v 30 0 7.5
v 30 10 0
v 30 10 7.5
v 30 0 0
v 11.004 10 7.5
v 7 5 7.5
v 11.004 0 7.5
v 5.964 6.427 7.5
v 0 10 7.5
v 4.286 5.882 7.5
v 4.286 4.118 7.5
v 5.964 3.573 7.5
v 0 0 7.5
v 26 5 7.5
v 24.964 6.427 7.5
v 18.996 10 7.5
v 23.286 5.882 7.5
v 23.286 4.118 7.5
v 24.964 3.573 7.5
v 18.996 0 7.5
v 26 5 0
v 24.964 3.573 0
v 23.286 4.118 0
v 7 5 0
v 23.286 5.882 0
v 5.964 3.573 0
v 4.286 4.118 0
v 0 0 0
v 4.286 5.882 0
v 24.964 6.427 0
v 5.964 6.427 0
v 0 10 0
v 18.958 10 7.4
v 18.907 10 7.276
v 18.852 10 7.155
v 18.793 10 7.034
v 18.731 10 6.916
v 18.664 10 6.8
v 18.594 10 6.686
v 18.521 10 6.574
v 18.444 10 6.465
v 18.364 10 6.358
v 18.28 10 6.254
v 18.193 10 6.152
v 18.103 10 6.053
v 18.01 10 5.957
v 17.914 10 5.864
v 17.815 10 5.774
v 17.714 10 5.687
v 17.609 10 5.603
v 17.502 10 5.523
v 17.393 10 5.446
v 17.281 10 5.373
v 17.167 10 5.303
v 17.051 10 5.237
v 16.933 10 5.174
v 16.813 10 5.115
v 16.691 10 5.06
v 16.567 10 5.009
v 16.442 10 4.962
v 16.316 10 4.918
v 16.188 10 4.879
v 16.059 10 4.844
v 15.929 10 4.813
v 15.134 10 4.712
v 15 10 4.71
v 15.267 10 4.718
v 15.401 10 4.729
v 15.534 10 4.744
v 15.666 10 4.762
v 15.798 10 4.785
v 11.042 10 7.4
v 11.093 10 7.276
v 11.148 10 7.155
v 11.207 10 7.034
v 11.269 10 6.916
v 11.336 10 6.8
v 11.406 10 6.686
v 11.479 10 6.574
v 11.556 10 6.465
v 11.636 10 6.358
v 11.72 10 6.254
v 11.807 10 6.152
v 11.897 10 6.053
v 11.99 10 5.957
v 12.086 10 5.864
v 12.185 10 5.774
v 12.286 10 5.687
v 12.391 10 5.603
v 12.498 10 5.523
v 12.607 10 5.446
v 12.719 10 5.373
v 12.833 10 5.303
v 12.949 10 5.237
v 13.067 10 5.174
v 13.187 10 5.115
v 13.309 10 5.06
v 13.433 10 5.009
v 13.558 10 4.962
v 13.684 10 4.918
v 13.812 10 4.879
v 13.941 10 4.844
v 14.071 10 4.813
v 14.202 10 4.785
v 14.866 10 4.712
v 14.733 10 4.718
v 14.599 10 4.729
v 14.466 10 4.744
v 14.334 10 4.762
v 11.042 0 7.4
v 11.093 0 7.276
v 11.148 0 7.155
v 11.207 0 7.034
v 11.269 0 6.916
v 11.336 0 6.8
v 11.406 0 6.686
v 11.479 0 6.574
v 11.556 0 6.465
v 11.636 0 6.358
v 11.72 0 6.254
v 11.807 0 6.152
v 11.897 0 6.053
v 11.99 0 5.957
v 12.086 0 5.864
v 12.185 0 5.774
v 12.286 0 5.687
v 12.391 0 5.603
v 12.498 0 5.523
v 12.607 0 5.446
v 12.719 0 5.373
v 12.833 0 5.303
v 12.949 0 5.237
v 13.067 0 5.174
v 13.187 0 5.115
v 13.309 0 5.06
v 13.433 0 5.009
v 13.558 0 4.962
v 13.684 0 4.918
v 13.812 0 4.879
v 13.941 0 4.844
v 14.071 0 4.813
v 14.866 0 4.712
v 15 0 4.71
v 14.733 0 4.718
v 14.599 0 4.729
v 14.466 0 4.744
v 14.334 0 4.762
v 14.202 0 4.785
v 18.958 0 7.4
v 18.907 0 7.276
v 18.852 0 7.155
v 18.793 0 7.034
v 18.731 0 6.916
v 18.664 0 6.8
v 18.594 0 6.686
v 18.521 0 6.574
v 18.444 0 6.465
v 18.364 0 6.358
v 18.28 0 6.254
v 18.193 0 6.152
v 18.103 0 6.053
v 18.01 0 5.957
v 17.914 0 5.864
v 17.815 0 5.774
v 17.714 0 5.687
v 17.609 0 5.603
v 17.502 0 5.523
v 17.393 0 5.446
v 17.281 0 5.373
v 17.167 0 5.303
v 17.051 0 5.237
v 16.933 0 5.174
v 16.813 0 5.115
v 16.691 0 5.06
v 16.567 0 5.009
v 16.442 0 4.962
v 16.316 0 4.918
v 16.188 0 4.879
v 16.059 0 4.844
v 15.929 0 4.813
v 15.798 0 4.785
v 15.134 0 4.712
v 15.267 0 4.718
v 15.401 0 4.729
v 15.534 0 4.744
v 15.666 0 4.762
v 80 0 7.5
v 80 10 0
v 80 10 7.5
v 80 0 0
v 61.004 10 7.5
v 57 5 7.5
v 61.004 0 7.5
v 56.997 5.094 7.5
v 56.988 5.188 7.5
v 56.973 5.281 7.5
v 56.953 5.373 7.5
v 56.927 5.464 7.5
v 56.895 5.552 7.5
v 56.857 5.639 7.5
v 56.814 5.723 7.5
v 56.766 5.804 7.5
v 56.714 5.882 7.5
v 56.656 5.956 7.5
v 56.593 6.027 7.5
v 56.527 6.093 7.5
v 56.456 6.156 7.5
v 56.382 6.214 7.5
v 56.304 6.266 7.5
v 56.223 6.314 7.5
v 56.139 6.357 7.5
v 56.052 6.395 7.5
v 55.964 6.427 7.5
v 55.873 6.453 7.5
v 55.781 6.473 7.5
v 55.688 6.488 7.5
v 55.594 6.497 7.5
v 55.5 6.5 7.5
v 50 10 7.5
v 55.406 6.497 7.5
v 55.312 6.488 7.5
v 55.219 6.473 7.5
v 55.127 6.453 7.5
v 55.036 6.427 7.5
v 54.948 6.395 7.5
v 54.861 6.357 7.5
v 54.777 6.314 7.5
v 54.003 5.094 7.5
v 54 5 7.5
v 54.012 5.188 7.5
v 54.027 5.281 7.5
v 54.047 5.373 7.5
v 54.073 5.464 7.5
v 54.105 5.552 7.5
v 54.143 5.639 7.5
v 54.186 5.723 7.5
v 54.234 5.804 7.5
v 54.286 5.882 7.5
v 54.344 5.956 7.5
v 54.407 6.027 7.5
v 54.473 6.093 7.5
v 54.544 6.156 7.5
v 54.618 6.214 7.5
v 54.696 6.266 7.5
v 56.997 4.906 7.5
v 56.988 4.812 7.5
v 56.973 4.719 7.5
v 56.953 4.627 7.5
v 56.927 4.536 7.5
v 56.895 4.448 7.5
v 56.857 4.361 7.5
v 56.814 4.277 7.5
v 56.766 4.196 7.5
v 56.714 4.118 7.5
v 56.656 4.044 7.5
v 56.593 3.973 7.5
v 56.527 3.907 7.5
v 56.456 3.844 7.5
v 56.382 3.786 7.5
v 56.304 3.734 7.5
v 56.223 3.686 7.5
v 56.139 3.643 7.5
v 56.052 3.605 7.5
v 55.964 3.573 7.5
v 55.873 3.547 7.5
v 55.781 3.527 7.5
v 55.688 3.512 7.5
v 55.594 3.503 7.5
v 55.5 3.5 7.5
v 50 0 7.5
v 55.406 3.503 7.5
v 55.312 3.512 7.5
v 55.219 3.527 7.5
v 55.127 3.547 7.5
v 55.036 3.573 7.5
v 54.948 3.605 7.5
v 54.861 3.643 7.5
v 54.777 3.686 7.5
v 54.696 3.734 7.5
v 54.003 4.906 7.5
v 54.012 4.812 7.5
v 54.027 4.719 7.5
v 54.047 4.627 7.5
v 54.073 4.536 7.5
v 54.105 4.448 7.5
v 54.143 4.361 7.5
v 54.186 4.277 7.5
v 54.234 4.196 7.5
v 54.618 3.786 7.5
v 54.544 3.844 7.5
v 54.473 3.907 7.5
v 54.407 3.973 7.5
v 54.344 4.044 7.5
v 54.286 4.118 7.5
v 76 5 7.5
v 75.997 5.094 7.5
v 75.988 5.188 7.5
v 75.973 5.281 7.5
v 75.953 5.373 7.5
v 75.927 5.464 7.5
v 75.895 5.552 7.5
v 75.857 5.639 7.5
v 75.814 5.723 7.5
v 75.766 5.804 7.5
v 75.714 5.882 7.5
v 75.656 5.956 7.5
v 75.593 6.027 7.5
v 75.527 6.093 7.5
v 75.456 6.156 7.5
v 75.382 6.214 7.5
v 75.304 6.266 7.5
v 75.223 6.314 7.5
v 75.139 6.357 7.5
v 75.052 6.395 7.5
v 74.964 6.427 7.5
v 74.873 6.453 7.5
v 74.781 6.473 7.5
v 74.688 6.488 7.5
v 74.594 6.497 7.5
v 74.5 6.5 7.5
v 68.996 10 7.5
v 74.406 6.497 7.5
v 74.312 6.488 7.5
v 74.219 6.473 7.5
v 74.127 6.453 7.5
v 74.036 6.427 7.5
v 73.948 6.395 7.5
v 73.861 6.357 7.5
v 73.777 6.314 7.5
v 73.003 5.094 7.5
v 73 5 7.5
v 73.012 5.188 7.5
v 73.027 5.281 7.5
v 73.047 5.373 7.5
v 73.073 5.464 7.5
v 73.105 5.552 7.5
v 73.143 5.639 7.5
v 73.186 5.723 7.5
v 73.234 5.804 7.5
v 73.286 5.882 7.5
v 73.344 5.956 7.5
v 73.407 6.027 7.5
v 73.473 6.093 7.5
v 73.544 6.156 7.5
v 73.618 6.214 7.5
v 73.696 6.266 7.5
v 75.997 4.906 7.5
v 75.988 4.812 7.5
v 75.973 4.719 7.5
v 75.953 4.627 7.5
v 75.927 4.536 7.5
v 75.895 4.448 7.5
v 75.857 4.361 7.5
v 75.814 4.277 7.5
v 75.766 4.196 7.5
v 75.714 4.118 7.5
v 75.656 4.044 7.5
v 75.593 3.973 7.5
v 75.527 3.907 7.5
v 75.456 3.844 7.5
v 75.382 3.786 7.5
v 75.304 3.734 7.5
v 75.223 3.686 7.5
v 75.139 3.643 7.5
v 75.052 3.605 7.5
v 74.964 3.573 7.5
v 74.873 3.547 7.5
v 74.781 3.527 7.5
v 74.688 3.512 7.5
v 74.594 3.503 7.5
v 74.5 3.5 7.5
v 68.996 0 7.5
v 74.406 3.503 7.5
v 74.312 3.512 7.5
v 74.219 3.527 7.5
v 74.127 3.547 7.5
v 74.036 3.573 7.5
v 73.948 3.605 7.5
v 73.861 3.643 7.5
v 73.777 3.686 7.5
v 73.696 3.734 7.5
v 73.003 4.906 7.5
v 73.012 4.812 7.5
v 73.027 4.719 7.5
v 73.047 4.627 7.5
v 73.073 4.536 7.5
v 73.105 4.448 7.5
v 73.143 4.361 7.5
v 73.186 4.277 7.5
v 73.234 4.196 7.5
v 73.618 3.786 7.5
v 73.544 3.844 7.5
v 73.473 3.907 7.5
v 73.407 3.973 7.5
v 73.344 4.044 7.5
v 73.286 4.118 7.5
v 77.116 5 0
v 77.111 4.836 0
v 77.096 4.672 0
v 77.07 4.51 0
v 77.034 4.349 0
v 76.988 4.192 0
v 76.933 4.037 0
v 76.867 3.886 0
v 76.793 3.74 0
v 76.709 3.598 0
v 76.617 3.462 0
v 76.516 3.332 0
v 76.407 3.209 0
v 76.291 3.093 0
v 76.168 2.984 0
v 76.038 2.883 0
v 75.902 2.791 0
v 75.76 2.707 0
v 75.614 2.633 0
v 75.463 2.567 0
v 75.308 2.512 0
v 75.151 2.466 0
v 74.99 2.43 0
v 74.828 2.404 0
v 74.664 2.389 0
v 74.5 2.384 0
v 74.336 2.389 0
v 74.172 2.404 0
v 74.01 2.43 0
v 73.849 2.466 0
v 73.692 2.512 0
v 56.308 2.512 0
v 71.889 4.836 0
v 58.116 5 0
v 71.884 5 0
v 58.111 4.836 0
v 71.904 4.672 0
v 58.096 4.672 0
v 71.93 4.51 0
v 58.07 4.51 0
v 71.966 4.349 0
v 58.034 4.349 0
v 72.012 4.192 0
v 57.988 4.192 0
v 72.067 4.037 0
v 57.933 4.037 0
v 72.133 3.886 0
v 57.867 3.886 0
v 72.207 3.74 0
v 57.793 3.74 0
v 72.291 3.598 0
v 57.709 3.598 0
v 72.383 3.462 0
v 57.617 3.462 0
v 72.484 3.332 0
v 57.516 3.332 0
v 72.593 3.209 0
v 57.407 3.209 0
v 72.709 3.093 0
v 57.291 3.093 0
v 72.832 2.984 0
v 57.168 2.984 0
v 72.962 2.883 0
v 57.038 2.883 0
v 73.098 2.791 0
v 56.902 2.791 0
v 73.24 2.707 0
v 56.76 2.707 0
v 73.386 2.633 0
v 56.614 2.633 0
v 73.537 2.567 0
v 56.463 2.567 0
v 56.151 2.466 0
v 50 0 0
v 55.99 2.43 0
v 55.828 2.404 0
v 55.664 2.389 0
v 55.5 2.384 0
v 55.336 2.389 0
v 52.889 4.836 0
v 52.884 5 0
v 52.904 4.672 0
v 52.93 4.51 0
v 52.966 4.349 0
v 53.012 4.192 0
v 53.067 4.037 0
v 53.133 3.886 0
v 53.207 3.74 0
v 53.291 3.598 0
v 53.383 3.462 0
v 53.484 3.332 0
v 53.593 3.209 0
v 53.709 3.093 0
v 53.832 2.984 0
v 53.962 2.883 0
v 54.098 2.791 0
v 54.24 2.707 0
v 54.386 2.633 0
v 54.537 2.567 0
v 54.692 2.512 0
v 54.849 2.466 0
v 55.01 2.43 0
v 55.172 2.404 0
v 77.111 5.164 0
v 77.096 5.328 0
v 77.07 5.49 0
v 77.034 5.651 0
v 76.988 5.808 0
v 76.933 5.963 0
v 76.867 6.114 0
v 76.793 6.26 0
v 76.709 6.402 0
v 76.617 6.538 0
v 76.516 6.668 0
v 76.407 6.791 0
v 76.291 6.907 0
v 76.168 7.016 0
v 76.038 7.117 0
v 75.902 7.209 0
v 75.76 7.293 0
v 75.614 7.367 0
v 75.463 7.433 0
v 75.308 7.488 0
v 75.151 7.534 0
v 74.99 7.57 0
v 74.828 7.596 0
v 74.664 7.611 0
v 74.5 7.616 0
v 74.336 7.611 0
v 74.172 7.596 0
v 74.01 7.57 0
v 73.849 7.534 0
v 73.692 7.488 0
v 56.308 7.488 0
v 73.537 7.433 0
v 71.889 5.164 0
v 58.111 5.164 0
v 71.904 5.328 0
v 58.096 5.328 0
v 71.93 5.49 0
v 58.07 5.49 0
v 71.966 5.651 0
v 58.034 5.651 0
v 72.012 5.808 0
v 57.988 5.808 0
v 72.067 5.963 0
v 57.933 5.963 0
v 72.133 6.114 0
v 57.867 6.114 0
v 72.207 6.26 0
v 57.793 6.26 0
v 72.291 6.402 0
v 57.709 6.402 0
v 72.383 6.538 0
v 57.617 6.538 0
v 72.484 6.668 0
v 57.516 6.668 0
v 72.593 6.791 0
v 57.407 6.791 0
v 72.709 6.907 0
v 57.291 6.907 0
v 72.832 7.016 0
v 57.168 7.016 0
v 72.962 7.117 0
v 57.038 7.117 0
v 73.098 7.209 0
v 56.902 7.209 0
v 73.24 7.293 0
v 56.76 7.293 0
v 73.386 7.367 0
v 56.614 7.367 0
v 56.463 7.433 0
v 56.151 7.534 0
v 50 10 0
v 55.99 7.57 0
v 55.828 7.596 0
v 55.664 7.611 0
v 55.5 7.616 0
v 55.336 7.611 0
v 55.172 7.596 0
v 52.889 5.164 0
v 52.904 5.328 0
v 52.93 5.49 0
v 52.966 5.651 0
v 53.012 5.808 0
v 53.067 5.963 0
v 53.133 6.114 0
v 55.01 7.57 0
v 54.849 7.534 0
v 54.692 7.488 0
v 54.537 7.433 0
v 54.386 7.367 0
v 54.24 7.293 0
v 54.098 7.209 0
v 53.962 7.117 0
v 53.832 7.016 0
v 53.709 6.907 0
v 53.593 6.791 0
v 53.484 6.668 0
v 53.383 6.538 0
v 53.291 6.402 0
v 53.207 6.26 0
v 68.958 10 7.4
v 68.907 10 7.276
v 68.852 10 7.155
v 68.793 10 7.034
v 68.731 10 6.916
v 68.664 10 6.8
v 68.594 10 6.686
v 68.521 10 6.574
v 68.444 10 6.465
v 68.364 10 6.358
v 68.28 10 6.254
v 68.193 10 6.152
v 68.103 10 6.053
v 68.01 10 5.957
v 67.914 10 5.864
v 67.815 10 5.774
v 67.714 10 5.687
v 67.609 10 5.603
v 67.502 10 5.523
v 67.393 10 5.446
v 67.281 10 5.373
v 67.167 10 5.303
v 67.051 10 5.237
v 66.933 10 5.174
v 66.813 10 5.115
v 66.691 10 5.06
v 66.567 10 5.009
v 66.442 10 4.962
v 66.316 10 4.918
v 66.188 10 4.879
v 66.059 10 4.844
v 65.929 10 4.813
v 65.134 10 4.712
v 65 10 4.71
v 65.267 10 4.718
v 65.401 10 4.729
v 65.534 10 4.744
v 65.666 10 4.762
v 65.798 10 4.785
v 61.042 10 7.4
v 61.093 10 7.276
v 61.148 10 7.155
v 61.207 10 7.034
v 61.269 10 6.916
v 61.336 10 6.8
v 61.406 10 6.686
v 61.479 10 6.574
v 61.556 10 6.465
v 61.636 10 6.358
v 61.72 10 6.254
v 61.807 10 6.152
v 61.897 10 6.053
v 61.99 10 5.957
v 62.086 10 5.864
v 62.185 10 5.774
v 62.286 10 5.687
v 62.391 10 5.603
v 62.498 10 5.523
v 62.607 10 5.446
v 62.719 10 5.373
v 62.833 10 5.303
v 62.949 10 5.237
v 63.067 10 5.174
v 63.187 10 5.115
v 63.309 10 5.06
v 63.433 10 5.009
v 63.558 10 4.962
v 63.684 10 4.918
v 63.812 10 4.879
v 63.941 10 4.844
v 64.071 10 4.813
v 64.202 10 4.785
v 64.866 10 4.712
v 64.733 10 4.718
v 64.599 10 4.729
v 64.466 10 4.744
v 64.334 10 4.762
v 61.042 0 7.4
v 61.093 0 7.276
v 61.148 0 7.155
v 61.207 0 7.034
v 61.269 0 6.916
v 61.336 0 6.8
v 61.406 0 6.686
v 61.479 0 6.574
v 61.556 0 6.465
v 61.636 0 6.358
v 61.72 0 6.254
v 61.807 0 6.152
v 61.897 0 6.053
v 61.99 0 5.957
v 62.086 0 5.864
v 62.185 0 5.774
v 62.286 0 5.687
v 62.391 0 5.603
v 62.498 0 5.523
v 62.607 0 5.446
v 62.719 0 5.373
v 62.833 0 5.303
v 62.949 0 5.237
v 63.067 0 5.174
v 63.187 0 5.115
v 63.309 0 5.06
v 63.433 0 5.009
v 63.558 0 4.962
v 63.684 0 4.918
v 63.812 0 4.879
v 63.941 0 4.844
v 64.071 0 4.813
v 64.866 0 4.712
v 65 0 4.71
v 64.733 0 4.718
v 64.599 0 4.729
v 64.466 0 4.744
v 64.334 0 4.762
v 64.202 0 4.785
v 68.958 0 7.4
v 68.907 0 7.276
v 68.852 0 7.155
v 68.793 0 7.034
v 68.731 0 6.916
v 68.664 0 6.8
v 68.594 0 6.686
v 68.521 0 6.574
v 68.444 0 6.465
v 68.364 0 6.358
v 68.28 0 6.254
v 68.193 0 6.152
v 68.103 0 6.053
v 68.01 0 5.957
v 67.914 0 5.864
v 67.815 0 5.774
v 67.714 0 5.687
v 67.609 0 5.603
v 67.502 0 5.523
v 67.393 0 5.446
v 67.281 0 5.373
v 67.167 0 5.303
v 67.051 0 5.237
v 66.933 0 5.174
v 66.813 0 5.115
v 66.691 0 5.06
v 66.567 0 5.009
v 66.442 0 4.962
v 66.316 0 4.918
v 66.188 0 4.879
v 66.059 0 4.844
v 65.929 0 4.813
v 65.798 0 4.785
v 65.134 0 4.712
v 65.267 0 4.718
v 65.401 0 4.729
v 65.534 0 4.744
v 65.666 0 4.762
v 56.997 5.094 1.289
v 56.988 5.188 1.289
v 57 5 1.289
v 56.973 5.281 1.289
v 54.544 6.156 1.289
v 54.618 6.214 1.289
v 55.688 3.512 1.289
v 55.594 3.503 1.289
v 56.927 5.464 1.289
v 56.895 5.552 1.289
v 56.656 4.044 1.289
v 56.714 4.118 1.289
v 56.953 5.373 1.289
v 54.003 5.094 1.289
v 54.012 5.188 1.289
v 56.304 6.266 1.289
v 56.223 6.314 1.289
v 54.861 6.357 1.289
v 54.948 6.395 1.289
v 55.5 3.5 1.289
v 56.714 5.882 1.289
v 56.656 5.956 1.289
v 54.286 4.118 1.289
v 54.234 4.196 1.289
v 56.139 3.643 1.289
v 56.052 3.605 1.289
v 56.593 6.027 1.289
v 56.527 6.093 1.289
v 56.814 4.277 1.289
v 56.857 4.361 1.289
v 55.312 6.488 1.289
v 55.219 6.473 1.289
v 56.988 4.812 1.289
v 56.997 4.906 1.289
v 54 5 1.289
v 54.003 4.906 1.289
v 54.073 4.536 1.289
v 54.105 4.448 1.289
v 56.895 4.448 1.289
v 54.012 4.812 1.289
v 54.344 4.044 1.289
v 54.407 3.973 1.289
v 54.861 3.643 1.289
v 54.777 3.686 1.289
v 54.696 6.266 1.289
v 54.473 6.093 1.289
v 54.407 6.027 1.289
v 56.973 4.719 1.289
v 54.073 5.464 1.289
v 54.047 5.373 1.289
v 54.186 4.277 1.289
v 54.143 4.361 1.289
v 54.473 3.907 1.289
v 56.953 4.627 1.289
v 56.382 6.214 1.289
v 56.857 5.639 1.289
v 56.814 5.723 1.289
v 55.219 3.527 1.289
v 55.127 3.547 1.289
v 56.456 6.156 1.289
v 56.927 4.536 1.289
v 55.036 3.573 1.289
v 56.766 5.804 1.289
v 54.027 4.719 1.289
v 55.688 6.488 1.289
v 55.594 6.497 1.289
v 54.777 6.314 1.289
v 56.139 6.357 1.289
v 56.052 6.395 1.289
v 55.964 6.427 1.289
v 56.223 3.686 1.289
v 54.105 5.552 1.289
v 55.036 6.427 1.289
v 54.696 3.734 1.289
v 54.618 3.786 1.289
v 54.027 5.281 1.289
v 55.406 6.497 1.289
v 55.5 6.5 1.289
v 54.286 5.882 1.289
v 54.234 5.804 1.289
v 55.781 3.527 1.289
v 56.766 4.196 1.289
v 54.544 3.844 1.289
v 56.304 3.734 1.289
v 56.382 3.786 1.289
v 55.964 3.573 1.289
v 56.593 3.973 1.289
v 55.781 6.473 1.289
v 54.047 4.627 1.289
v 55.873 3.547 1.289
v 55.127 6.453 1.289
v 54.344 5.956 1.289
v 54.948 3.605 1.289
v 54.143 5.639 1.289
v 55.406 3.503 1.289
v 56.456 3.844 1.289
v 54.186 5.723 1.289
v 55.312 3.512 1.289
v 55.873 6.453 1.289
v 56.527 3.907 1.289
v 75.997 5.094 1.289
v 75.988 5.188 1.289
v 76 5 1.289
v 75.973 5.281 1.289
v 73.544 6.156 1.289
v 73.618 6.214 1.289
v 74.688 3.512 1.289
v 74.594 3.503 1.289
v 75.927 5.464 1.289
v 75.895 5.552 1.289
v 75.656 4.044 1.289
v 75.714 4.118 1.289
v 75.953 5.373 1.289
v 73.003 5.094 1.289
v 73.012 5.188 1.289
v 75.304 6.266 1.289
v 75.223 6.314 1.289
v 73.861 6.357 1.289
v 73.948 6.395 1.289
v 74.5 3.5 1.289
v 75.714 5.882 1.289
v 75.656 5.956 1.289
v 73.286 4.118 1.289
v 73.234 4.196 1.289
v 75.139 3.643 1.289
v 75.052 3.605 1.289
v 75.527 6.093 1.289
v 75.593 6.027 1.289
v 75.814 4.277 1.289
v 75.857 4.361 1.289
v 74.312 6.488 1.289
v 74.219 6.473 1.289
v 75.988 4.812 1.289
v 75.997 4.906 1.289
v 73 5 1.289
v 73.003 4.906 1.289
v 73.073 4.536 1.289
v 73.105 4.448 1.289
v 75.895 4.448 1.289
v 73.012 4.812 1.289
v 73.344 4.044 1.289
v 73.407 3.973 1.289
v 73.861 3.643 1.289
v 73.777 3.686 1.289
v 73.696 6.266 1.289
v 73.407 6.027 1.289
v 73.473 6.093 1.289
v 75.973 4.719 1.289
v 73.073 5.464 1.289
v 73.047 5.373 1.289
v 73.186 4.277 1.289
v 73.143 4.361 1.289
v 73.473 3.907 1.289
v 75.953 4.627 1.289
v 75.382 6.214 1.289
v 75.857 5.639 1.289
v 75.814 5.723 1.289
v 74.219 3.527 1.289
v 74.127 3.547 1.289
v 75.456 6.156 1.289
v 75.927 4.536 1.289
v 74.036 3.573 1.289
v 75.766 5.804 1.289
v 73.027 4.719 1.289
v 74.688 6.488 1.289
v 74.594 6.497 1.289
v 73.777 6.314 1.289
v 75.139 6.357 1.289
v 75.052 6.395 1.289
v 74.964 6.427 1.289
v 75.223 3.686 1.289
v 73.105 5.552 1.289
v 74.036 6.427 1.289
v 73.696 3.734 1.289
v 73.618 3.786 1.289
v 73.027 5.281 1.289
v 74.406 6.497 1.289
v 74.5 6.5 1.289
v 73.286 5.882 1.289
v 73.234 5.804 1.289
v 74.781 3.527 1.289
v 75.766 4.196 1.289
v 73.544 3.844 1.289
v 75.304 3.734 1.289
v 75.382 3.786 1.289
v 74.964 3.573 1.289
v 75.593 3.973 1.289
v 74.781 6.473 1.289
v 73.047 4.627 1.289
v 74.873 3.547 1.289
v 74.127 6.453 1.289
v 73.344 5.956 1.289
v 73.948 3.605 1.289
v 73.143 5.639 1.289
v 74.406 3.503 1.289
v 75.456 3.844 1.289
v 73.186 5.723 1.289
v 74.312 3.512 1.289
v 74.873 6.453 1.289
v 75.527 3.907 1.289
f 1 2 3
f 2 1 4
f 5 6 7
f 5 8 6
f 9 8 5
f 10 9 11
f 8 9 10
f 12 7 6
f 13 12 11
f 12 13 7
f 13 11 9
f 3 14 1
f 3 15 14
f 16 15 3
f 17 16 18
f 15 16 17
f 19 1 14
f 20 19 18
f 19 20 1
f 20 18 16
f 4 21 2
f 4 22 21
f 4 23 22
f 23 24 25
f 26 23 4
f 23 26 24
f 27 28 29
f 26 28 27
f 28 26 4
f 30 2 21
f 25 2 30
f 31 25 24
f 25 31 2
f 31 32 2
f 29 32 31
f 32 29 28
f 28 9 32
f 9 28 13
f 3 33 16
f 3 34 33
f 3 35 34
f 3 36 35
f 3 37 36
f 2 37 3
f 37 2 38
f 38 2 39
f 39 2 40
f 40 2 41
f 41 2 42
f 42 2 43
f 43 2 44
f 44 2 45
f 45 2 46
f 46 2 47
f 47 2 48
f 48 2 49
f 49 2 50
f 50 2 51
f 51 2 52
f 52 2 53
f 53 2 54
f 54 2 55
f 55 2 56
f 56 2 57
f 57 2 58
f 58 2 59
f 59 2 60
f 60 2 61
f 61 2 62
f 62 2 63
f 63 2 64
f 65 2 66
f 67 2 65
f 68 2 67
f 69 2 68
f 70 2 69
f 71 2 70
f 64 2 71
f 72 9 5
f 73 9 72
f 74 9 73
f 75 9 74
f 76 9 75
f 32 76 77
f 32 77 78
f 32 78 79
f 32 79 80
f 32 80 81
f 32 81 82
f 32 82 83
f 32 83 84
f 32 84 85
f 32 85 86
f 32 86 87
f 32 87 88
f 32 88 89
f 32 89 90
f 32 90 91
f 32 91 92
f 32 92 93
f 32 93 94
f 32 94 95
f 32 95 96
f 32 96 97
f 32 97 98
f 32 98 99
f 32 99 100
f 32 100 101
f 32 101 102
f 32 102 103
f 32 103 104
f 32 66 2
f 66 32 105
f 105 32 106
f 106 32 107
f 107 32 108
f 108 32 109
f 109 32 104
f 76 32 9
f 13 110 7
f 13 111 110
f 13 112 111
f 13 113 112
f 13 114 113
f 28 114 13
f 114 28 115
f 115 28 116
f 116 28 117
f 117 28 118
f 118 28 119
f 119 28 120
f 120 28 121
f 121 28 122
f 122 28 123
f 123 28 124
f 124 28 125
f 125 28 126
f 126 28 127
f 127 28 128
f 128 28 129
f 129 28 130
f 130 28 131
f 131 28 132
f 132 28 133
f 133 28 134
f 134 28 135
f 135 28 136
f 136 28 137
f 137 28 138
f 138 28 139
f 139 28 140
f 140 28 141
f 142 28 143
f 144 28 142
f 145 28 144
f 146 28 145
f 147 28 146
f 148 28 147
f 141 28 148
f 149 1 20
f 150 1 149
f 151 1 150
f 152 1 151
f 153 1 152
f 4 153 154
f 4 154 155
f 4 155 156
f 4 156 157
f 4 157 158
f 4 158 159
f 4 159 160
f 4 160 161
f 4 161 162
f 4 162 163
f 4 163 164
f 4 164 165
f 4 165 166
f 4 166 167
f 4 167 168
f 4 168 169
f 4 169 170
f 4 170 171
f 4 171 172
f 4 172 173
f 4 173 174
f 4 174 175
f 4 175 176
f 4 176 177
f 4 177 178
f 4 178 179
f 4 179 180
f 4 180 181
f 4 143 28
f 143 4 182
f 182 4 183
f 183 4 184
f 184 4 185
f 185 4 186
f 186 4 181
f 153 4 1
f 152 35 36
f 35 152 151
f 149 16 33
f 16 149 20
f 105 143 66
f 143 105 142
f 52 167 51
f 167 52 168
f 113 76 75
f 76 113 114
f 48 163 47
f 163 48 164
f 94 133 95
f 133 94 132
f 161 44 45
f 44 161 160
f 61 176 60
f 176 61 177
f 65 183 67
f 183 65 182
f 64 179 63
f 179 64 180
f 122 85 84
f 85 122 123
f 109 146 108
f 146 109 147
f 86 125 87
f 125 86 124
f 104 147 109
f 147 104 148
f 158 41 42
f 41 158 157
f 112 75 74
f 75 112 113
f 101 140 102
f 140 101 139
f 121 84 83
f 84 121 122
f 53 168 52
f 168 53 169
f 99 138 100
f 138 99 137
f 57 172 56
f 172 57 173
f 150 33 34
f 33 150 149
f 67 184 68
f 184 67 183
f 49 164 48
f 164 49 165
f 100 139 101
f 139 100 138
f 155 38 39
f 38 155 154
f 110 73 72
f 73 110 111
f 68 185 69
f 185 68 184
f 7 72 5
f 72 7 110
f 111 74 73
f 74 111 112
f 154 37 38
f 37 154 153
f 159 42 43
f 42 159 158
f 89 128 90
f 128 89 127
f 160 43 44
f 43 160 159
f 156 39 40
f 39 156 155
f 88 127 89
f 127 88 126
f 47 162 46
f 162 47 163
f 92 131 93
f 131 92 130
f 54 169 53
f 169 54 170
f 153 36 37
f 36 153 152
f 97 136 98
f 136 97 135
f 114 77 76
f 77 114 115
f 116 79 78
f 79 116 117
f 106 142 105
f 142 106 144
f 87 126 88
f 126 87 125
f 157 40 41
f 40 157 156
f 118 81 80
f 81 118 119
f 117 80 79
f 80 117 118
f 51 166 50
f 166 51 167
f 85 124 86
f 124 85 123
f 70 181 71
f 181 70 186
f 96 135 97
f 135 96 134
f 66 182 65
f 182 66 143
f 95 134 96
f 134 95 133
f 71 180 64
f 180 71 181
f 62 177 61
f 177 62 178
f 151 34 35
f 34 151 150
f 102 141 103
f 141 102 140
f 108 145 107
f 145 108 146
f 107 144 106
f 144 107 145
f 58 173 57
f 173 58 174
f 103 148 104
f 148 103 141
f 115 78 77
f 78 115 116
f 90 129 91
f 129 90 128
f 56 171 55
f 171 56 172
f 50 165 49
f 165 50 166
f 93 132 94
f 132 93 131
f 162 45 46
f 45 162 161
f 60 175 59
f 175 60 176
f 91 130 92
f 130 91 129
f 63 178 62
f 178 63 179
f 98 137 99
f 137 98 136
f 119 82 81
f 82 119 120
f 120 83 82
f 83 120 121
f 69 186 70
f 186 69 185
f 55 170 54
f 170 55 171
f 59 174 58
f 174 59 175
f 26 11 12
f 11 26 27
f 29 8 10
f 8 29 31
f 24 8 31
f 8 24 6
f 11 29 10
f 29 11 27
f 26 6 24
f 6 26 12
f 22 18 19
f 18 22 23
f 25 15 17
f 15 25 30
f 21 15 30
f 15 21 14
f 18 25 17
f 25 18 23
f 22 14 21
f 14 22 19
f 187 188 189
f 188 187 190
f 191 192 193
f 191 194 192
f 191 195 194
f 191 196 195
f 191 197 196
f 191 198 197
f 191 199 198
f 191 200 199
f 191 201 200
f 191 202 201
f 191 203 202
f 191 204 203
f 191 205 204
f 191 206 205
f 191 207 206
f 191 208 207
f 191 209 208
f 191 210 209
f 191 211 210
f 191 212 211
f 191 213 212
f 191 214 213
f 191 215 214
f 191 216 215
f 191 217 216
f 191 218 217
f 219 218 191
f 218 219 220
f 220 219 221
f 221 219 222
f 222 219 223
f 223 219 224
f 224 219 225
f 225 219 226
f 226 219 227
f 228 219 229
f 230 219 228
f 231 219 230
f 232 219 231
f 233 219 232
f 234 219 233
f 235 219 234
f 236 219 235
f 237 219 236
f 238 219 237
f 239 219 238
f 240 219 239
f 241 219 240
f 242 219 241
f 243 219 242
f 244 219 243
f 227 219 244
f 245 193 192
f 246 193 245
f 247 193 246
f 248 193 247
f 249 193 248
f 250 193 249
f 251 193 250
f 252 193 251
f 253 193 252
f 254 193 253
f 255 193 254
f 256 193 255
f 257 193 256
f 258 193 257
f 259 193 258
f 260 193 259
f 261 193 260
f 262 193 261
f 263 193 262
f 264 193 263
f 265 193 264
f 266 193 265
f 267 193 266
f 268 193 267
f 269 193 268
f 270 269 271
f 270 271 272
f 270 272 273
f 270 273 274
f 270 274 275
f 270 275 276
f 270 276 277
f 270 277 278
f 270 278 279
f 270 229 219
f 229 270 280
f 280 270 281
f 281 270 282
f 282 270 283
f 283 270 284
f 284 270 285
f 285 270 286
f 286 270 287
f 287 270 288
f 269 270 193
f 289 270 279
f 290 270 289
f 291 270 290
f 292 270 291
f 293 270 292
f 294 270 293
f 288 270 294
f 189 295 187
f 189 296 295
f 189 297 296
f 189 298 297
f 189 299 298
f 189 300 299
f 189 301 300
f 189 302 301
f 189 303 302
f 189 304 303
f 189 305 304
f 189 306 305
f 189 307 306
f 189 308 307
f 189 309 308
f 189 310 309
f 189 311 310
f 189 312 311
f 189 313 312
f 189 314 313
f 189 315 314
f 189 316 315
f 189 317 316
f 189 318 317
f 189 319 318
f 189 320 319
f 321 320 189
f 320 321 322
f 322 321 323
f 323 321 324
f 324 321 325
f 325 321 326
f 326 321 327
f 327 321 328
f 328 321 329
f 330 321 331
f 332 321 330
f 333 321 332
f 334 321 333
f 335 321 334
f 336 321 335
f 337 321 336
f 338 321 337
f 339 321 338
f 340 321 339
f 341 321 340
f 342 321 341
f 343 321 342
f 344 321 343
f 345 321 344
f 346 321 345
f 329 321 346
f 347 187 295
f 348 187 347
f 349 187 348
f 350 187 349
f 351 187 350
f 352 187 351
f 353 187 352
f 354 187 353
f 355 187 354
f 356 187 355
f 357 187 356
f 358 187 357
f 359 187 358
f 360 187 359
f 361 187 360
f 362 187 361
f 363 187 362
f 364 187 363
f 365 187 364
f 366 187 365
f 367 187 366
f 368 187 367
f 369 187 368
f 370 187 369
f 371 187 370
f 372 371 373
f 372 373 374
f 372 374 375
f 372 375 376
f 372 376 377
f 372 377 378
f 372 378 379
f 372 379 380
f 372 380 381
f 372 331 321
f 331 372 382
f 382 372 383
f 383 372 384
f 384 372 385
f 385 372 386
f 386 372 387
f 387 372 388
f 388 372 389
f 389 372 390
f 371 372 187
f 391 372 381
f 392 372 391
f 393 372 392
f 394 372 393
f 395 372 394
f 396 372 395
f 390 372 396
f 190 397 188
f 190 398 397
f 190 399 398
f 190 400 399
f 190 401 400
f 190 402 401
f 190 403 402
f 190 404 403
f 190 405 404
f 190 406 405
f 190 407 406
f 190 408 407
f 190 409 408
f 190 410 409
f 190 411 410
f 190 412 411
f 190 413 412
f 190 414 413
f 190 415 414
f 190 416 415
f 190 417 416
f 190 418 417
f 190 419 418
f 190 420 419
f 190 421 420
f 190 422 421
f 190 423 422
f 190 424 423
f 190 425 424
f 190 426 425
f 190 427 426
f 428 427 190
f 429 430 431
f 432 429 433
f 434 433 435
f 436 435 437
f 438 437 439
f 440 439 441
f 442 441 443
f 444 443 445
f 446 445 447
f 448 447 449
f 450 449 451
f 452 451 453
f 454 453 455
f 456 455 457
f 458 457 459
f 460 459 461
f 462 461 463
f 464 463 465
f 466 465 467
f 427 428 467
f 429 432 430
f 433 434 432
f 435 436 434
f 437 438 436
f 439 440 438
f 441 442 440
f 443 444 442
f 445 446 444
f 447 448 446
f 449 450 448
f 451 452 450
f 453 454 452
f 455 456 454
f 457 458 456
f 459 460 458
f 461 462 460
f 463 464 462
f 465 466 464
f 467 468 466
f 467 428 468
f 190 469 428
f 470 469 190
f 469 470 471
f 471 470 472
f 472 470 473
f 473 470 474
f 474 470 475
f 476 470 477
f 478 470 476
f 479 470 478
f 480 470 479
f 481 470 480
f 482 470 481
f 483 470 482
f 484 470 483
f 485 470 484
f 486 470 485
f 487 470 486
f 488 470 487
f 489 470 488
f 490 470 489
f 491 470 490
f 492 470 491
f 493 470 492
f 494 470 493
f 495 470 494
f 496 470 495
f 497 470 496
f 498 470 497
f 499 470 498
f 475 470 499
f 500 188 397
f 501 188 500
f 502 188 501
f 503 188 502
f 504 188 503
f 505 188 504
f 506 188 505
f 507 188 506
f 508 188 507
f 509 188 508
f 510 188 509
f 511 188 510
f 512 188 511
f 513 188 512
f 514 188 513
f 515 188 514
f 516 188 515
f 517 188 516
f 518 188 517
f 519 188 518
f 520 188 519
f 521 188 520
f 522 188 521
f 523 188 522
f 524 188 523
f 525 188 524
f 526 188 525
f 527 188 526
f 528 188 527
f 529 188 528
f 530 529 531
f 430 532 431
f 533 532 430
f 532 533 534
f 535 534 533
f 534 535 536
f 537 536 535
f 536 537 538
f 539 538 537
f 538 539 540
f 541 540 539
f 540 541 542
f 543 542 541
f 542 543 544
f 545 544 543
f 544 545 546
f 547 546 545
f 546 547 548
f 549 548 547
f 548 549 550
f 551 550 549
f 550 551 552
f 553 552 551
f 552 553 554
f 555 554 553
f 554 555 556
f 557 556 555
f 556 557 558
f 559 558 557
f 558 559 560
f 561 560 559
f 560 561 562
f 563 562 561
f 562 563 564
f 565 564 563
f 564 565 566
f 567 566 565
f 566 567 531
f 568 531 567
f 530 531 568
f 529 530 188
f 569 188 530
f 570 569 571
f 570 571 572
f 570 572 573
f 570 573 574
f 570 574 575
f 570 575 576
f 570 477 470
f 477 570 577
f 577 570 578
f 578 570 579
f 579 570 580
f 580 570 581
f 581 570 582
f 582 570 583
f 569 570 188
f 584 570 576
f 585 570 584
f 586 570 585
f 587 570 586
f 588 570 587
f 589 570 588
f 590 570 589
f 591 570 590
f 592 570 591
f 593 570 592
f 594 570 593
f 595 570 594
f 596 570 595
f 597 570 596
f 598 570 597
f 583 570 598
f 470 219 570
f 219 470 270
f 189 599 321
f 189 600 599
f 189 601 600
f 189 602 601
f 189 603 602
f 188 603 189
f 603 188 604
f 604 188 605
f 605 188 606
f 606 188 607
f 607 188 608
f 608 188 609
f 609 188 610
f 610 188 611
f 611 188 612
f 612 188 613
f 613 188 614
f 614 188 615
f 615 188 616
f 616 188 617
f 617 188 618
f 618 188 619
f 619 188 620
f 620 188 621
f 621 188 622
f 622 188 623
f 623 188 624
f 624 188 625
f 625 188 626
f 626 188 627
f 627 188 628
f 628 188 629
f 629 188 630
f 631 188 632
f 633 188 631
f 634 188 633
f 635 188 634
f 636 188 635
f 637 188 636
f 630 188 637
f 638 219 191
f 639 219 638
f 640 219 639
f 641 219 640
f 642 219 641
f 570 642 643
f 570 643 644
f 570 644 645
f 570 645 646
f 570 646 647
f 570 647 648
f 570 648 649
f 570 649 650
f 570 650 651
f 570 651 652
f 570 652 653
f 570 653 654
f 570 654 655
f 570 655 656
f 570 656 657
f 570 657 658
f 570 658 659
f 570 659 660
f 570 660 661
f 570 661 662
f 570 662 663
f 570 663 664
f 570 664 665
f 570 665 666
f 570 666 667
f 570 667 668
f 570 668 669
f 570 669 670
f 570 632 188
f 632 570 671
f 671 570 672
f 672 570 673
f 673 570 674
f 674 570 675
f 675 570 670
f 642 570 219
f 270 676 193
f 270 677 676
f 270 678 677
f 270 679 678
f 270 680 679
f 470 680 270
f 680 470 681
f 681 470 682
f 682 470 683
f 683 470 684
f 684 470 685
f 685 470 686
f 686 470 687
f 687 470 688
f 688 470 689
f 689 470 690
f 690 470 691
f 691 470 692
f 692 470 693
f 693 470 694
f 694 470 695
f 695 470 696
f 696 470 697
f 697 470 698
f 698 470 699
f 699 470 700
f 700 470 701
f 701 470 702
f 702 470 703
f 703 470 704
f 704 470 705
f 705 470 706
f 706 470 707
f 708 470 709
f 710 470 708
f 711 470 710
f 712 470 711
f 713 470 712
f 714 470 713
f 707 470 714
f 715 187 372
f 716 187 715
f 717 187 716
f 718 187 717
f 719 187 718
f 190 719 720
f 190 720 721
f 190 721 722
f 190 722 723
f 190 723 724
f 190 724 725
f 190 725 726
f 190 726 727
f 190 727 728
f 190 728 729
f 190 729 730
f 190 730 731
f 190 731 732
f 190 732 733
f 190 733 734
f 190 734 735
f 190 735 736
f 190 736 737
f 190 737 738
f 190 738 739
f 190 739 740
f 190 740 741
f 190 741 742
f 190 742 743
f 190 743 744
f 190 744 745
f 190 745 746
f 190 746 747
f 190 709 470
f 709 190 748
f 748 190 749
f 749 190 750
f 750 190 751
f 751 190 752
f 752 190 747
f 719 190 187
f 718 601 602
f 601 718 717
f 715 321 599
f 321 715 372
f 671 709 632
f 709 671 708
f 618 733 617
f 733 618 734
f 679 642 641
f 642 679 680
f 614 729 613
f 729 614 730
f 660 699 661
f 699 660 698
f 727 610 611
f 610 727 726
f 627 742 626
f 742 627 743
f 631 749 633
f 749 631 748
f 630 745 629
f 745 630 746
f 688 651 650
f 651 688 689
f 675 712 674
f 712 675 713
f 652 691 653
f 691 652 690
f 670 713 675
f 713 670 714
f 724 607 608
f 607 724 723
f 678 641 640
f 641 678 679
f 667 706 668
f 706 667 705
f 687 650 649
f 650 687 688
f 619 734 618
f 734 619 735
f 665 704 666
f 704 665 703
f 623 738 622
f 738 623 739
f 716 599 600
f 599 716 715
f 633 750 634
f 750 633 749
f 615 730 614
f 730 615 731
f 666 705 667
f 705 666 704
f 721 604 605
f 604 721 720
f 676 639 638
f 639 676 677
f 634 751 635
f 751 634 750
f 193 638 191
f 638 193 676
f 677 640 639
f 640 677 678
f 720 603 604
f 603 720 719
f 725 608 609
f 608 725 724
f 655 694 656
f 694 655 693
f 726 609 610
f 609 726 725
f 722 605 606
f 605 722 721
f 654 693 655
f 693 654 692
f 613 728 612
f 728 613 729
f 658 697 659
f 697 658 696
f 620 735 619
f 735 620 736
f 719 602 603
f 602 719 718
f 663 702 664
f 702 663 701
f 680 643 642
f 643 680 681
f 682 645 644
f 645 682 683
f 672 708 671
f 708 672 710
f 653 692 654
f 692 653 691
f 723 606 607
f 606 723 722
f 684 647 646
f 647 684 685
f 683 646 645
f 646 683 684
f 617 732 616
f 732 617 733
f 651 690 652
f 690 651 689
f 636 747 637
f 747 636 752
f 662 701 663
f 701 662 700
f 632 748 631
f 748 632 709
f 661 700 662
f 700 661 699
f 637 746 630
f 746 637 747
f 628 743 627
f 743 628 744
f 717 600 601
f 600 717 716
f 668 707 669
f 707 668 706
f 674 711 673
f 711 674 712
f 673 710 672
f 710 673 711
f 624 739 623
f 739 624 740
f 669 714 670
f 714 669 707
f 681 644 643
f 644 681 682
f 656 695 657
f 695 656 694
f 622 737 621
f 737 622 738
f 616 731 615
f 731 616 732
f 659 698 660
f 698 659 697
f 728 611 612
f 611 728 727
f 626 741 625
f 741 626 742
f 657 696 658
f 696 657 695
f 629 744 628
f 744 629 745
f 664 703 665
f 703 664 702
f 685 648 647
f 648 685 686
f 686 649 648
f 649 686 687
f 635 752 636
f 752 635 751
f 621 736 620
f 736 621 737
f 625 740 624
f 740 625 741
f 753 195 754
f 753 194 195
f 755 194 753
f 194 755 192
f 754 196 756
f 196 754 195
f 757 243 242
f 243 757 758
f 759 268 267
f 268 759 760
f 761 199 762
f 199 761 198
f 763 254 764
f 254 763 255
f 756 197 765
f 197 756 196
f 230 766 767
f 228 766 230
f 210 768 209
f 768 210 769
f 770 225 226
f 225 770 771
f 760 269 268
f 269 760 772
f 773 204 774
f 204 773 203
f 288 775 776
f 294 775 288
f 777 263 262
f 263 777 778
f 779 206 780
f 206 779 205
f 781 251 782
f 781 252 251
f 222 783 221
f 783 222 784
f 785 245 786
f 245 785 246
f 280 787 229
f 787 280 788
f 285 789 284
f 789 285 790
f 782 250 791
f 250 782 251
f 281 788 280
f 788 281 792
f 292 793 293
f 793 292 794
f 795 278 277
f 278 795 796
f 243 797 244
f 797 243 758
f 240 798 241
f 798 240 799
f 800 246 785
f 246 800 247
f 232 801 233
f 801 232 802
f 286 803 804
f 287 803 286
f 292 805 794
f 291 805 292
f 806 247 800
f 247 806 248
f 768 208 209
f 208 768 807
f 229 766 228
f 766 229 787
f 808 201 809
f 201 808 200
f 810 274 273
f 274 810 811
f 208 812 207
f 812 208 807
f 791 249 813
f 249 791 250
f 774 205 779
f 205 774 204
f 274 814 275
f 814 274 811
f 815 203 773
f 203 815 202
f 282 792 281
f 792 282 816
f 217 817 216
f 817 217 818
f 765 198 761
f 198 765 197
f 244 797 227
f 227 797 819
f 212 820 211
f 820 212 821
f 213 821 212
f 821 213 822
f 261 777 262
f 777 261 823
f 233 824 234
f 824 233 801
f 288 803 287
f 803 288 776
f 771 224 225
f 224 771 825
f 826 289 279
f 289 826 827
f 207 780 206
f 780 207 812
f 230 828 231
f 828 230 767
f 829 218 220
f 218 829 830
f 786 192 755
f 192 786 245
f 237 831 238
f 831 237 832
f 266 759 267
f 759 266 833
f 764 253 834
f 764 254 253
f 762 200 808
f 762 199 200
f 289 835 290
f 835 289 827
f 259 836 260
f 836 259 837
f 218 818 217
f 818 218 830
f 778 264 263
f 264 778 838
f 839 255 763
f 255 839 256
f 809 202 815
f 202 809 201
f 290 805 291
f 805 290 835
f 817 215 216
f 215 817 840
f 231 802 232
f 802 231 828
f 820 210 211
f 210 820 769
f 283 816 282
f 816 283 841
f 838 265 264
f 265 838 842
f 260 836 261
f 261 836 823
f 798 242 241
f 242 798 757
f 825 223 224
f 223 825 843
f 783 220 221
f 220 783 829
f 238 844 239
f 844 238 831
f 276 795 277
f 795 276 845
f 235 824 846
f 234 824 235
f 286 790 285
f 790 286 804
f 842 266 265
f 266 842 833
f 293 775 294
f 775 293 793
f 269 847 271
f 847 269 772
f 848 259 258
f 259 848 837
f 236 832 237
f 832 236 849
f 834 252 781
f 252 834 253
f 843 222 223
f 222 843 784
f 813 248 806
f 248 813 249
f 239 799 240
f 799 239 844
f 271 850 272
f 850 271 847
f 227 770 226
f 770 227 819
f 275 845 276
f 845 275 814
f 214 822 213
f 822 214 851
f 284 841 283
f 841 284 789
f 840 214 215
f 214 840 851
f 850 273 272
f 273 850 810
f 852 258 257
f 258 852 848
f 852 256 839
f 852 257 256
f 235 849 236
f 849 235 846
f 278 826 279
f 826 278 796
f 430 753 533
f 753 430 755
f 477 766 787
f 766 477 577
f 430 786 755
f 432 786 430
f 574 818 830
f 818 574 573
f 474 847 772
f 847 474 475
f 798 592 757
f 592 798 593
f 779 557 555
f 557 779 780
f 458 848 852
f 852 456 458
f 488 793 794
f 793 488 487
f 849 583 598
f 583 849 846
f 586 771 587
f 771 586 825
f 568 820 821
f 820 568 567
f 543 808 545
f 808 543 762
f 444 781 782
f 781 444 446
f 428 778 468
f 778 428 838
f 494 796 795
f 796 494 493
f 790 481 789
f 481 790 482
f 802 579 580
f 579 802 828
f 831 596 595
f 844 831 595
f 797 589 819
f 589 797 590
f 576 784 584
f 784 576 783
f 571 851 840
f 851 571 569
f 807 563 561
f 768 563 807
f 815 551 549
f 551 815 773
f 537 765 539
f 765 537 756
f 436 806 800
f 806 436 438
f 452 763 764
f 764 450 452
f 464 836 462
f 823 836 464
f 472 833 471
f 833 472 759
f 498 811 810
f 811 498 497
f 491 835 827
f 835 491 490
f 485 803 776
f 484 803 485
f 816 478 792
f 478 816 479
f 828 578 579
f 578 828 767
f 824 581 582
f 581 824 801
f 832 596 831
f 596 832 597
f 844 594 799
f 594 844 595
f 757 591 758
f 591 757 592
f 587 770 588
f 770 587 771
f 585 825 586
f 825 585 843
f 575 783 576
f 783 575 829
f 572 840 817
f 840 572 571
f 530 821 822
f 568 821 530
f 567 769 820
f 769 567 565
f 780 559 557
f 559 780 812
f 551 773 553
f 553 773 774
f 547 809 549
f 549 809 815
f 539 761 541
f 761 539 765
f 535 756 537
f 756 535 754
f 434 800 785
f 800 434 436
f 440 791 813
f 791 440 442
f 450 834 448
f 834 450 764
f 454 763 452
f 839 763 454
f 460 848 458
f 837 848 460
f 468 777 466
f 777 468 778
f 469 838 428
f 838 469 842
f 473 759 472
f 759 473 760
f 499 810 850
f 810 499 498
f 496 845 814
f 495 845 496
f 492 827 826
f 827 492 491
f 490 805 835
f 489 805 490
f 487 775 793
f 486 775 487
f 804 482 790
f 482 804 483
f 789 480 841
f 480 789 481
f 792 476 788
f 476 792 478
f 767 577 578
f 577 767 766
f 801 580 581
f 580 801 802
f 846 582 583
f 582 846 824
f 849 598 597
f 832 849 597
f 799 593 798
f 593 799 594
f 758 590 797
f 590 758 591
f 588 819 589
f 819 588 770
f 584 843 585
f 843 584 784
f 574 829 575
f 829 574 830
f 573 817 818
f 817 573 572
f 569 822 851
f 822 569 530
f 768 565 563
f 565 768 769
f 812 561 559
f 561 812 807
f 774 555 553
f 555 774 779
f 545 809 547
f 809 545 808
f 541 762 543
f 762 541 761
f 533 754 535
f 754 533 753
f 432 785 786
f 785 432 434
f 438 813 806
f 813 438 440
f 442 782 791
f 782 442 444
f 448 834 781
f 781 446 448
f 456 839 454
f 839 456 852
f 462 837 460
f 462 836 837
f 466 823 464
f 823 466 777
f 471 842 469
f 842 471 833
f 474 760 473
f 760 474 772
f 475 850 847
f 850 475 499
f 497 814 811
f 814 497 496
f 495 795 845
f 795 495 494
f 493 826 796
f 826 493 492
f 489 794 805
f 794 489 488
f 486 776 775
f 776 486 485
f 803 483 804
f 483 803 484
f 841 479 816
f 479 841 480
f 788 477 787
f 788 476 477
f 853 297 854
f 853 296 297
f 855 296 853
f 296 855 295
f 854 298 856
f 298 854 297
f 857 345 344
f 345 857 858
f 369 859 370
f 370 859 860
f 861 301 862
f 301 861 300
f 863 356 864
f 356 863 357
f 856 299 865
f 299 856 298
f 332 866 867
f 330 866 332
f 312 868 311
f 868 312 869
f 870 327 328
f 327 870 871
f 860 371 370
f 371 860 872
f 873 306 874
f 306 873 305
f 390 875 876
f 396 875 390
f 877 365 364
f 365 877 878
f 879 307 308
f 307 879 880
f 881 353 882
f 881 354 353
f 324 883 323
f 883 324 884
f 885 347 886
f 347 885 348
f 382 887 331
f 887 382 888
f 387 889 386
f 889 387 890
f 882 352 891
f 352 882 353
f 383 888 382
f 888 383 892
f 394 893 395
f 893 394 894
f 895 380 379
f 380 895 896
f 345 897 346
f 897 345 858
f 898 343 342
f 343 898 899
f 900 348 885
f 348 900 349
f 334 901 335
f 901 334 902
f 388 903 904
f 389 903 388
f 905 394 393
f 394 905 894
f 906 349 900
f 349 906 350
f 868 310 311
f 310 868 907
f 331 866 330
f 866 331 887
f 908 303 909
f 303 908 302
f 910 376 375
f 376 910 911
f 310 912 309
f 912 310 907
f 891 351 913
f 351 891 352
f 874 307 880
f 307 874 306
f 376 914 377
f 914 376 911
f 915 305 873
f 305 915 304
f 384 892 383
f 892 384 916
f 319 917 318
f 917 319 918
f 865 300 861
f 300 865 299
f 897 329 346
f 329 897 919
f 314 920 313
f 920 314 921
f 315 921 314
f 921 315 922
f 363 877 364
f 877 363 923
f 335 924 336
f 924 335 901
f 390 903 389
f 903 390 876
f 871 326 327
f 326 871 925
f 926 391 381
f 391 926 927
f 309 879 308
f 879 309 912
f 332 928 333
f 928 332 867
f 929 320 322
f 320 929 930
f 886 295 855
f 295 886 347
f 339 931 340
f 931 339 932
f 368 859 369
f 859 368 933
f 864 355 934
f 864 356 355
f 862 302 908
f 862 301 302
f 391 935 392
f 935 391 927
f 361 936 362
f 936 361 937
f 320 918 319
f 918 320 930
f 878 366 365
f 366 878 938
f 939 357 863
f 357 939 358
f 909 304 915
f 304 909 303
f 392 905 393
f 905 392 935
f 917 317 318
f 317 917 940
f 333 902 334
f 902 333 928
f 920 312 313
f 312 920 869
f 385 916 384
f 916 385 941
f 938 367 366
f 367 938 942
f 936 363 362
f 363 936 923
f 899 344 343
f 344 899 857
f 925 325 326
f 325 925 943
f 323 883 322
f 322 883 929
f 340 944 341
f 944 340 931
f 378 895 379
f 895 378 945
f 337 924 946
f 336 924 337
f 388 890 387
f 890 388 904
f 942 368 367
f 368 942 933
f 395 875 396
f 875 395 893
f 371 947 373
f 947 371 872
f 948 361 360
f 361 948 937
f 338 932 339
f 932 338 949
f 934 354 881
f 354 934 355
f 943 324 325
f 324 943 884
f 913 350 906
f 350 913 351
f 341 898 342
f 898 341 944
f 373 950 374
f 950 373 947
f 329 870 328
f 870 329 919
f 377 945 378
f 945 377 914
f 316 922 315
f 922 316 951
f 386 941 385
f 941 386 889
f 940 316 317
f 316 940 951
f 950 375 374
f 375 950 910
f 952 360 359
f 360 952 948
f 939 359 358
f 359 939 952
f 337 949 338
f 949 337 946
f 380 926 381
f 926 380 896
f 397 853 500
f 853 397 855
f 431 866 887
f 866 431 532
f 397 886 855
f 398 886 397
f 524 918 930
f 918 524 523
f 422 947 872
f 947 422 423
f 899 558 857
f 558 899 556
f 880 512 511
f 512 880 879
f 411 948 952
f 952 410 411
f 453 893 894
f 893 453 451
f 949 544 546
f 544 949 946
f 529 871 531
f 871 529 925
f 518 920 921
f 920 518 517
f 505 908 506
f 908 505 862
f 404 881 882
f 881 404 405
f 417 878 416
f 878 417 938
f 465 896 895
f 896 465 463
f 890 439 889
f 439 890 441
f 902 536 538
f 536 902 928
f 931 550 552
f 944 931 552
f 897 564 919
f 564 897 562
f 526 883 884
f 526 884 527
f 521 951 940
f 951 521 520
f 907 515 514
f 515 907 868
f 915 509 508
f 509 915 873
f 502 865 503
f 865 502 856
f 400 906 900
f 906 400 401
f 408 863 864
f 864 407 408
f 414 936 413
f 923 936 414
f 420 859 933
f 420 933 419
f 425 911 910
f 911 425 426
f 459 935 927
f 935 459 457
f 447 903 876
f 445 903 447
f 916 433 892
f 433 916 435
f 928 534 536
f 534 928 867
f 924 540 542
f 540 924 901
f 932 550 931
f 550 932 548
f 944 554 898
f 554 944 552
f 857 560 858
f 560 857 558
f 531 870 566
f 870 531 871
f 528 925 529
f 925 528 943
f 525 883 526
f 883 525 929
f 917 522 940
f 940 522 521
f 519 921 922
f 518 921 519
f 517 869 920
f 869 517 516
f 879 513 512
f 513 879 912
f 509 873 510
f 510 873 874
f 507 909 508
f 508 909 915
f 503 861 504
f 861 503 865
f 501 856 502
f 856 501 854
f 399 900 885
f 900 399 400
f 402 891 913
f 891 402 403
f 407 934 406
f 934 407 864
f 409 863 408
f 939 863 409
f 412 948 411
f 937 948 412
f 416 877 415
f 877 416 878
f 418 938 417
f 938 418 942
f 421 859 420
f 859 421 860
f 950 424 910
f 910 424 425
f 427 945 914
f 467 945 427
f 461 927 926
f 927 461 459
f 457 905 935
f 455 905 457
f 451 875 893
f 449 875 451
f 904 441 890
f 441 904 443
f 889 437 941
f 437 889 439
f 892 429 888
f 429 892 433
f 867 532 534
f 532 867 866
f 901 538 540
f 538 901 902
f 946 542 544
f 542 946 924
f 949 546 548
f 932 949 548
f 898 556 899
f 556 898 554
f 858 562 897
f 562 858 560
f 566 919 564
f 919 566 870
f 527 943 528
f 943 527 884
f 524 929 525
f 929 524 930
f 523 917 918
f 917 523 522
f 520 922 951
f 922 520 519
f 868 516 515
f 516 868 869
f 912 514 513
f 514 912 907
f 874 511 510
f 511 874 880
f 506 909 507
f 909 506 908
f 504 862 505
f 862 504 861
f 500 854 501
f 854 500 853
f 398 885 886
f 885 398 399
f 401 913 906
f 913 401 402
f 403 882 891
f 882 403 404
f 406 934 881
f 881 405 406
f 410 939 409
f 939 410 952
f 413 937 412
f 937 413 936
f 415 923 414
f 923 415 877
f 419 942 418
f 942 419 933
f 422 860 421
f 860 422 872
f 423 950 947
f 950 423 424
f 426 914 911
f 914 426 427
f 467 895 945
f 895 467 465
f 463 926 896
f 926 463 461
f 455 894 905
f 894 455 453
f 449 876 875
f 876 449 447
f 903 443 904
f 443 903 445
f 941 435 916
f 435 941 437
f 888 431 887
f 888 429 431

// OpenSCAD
// file: ../math/vect.scad
function vect_scalar_sum(v, incr) = [for (i = [0: len(v) - 1]) v[i] + incr];

function vSize(size) = (!is_list(size)) ? [size, size, size]: size; 


function vect_2d_to_3d(vect, z = 0) = [vect[0], vect[1], z];

function vect_rotate2d(vect, b) = [
    cos(b) * vect[0] - sin(b) * vect[1],
    sin(b) * vect[0] + cos(b) * vect[1]
];

function round_vect(v) = [for (i = [0: len(v) - 1]) round(v[i])];

function vect_swap_xy(v1) = [v1.y, v1.x, v1.z];

function vectorize_2(x) = is_list(x) ? [x.x, x.y] : [x, x];

function vectorize_3(x) = is_list(x) ? [x.x, x.y, x.z] : [x, x, x];

echo (vectorize_3(1));
// file: ../math/align.scad
use <vect.scad>
module align_center(sizes, center = true, centerZ = false, vector=[1, 1, 0]){
    xxx=vector.x;
    yyy=vector.y;
    zzz=centerZ || vector.z;
    sizes = vSize(sizes);
    if (center){
        translate([xxx ? -sizes[0] / 2 : 0, yyy ? -sizes[1] / 2: 0, zzz ? -sizes[2]/2 : 0]){
            children();
        }
    } else {
        children();
    }   
}

module align_uncenter(sizes, uncenter = true, uncenterZ = false){
    sizes = vSize(sizes);
    if (uncenter){
        translate([sizes[0] / 2, sizes[1] / 2, (uncenterZ ? sizes[2]/2 : 0)]){
            children();
        }
    } else {
        children();
    }   
}

ALIGN_LEFT=[1, 0, 0];
ALIGN_RIGHT=[-1, 0, 0];
ALIGN_BOTTOM=[0, 0, -1];
ALIGN_TOP=[0, 0, 1];
ALIGN_BACK=[0, -1, 0];
ALIGN_FWD=[0, 1, 0];

function _aligner(target, source, align) = 
            align > 0 ? target * align:
            align < 0 ? source * align:
            (target - source) / 2;    

function aligner(target_sizes, source_sizes, vector) = [
    vector.x == undef ? 0 : _aligner(target_sizes.y, source_sizes.x, vector.x),
    vector.y == undef ? 0 : _aligner(target_sizes.y, source_sizes.y, vector.y),
    vector.z == undef ? 0 : _aligner(target_sizes.z, source_sizes.z, vector.z)
];

module align_relative(
    target_sizes, 
    source_sizes, 
    vector=[0,0,undef]
    ){
        
    // x = vector.x == undef ? 0 : _aligner(target_sizes.y, source_sizes.x, vector.x);
    // y = vector.y == undef ? 0 : _aligner(target_sizes.y, source_sizes.y, vector.y);
    // z = vector.z == undef ? 0 : _aligner(target_sizes.z, source_sizes.z, vector.z);
    translate(aligner(target_sizes, source_sizes, vector))
        children();
}

module align_center_source_vs_target(target_sizes, source_sizes, centerZ = false){
    align_relative(target_sizes=target_sizes, source_sizes=source_sizes, vector=[0, 0, centerZ ? 1 : 0]);
    // align_uncenter(target_sizes, uncenterZ = centerZ)
    // union(){
    //     align_center(target_sizes, center = true, centerZ = centerZ)
    //         children(0);
    //     align_center(source_sizes, center = true, centerZ = centerZ)
    //         children(1);
    // }
}


module zz(z){
    translate([0, 0, z])
        children();
}

module xx(x){
    translate([x, 0, 0])
        children();
}

module yy(y){
    translate([0, y, 0])
        children();
}

module zc(){
    translate([0, 0, -0.01])
        children();
}
module xc(){
    translate([-0.01, 0, 0])    
        children();
}
module yc(){
    translate([0, -0.01, 0])
        children();
}

// align_center_source_vs_target([100, 100, 1], [10, 10, 10], centerZ = false){
//     cube([100,100,1]);
//     cube([10,10,10]);
// }

// align_center(20){
//     align_uncenter(20){
//         cube(20);
//     }
// }

// target_sizes = [20, 20, 20];
// source_sizes = [10, 10, 10];
// color("azure",0.25)
//     cube(size=target_sizes);
// align_relative(target_sizes=target_sizes, source_sizes=source_sizes, vector=[0, 0, undef]){
//     color("red",0.25)
//         zz(20)
//         cube(size=source_sizes);
// }
// file: ../screws/screw_holes.scad
use <../math/align.scad>

module screw_hole(d, h, chamferD = undef, chamferA = 30, mirrorZ = false){
    chamferD = chamferD == undef ? d * 1.75: chamferD;
    chamferH = chamferD * tan(chamferA);

    module _m(){
        cylinder(d = d, h = h);
        zz(h - chamferH)
        cylinder(r2 = chamferD / 2, r1 = 0,  h = chamferH);
    }

    if (mirrorZ){
        translate([0, 0, h]) mirror([0, 0, 1]) 
            _m();
    } else {
        _m();
    }
}


module four_screw_holes(size, d, chamferD = undef, chamferA = 30){
    module _h(){
        screw_hole(d = d, h = size.z, chamferD, chamferA);
    }
    xx(size.x)
        _h();
    yy(size.y)
        _h();
    yy(size.y)
    xx(size.x)
        _h();
    _h();
}

$fn=100;
screw_hole(3, 5);
//four_screw_holes([100, 100, 10], 10, 15);
// file: ../primitives/arc.scad
use <../math/align.scad>

function _R(l, h) = (pow(l, 2) + pow(h, 2)) / (2 * h);

module arc_2d(w, h){
    r = _R( w/2, h);    
    difference() {
        translate([0, - r + h]) 
            circle(r=r);
        mirror([0, 1, 0]) 
        translate([-r - 5, 0, 0]) 
            square([r*2 + 10, r * 2 + 10]);
    }
}

module arc_3d(x, y, h){
    translate(v = [x / 2, 0]) 
    linear_extrude(height=h) 
        arc_2d(x, y);
}

module arc_cube(size, arcSizes, 
    compensateArcs = true,
    center = false
    ){
    arcSizes = is_list(arcSizes) ? arcSizes : [arcSizes, arcSizes, arcSizes, arcSizes];
    module _main_arc(){
        cube(size);
        mirror([0, 1, 0]) 
            arc_3d(size.x, arcSizes.x, size.z); 
        translate([0, size.y, 0])
            arc_3d(size.x, arcSizes.x, size.z); 
        rotate([0, 0, 90])
            arc_3d(size.x, arcSizes.y, size.z); 
        
        translate([size.x, 0, 0]) mirror([0, 1, 0]) rotate([0, 0, -90])
            arc_3d(size.x, arcSizes.y, size.z); 
    }


    if (!center){
        translate(compensateArcs ? [arcSizes[2], arcSizes[3]] : [0, 0]) _main_arc();
    } else {
        align_center(sizes = size)
        _main_arc();
    }
}

$fn=200;
arc_cube(size = [50, 50, 50], arcSizes = 3, center = true);
// // linear_extrude(height=10) 
// //     arc_2d(20, 3);

// // h = 3;
// // w = 20;
// // r = _R( w/2, h);
// $fn=100;
// arc_3d(40, 10, 20);
// main file
use <../primitives/arc.scad>
use <../screws/screw_holes.scad>
diameter_multiplier = 0.7;

module simple_cable_holder_bottom(size, cableD, screwD){
    module _arc_cable_hole(){
        translate([-cableD/2, 0])
        rotate([-90, 0, 0])
        color ("red") arc_3d(cableD, cableD / 2 * diameter_multiplier, size.y + 1);
    }
    module _m(){
        difference() {
            cube([size.x, size.y, size.z / 2]);
            //
            //cylinder(d=cableD, h=size.y + 1);
            translate([size.x / 2, -0.5, size.z / 2 + 0.01])
                _arc_cable_hole();
        }
    }
    difference() {
        _m();
        translate([(size.x - cableD) / 4, size.y / 2, -0.01]) 
            cylinder(d=screwD, h=size.z);
        translate([size.x - (size.x - cableD) / 4, size.y / 2, -0.01]) 
            cylinder(d=screwD, h=size.z);
    }
}

module simple_cable_holder_top(size, cableD, screwD){
    module _arc_cable_hole(){
        translate([-cableD/2, 0])
        rotate([-90, 0, 0])
        color ("red") arc_3d(cableD, cableD / 2 * diameter_multiplier, size.y + 1);
    }
    module _m(){
        difference() {
            cube([size.x, size.y, size.z / 2]);
            //
            //cylinder(d=cableD, h=size.y + 1);
            translate([size.x / 2, -0.5, size.z / 2 + 0.01])
                _arc_cable_hole();
        }
    }
     difference() {
        _m();
        translate([(size.x - cableD) / 4, size.y / 2, -0.01]) 
            screw_hole(d=screwD, h=size.z, mirrorZ = true);
        translate([size.x - (size.x - cableD) / 4, size.y / 2, -0.01]) 
            screw_hole(d=screwD, h=size.z, mirrorZ = true);
    }
}

simple_cable_holder_bottom(size = [30, 10, 15], cableD = 8, screwD = 3);
translate([50, 0, 0]) 
simple_cable_holder_top([30, 10, 15], cableD = 8, screwD = 3);
//simple_cable_holder_top([130, 10, 15], cableD = 8, screwD = 3);
